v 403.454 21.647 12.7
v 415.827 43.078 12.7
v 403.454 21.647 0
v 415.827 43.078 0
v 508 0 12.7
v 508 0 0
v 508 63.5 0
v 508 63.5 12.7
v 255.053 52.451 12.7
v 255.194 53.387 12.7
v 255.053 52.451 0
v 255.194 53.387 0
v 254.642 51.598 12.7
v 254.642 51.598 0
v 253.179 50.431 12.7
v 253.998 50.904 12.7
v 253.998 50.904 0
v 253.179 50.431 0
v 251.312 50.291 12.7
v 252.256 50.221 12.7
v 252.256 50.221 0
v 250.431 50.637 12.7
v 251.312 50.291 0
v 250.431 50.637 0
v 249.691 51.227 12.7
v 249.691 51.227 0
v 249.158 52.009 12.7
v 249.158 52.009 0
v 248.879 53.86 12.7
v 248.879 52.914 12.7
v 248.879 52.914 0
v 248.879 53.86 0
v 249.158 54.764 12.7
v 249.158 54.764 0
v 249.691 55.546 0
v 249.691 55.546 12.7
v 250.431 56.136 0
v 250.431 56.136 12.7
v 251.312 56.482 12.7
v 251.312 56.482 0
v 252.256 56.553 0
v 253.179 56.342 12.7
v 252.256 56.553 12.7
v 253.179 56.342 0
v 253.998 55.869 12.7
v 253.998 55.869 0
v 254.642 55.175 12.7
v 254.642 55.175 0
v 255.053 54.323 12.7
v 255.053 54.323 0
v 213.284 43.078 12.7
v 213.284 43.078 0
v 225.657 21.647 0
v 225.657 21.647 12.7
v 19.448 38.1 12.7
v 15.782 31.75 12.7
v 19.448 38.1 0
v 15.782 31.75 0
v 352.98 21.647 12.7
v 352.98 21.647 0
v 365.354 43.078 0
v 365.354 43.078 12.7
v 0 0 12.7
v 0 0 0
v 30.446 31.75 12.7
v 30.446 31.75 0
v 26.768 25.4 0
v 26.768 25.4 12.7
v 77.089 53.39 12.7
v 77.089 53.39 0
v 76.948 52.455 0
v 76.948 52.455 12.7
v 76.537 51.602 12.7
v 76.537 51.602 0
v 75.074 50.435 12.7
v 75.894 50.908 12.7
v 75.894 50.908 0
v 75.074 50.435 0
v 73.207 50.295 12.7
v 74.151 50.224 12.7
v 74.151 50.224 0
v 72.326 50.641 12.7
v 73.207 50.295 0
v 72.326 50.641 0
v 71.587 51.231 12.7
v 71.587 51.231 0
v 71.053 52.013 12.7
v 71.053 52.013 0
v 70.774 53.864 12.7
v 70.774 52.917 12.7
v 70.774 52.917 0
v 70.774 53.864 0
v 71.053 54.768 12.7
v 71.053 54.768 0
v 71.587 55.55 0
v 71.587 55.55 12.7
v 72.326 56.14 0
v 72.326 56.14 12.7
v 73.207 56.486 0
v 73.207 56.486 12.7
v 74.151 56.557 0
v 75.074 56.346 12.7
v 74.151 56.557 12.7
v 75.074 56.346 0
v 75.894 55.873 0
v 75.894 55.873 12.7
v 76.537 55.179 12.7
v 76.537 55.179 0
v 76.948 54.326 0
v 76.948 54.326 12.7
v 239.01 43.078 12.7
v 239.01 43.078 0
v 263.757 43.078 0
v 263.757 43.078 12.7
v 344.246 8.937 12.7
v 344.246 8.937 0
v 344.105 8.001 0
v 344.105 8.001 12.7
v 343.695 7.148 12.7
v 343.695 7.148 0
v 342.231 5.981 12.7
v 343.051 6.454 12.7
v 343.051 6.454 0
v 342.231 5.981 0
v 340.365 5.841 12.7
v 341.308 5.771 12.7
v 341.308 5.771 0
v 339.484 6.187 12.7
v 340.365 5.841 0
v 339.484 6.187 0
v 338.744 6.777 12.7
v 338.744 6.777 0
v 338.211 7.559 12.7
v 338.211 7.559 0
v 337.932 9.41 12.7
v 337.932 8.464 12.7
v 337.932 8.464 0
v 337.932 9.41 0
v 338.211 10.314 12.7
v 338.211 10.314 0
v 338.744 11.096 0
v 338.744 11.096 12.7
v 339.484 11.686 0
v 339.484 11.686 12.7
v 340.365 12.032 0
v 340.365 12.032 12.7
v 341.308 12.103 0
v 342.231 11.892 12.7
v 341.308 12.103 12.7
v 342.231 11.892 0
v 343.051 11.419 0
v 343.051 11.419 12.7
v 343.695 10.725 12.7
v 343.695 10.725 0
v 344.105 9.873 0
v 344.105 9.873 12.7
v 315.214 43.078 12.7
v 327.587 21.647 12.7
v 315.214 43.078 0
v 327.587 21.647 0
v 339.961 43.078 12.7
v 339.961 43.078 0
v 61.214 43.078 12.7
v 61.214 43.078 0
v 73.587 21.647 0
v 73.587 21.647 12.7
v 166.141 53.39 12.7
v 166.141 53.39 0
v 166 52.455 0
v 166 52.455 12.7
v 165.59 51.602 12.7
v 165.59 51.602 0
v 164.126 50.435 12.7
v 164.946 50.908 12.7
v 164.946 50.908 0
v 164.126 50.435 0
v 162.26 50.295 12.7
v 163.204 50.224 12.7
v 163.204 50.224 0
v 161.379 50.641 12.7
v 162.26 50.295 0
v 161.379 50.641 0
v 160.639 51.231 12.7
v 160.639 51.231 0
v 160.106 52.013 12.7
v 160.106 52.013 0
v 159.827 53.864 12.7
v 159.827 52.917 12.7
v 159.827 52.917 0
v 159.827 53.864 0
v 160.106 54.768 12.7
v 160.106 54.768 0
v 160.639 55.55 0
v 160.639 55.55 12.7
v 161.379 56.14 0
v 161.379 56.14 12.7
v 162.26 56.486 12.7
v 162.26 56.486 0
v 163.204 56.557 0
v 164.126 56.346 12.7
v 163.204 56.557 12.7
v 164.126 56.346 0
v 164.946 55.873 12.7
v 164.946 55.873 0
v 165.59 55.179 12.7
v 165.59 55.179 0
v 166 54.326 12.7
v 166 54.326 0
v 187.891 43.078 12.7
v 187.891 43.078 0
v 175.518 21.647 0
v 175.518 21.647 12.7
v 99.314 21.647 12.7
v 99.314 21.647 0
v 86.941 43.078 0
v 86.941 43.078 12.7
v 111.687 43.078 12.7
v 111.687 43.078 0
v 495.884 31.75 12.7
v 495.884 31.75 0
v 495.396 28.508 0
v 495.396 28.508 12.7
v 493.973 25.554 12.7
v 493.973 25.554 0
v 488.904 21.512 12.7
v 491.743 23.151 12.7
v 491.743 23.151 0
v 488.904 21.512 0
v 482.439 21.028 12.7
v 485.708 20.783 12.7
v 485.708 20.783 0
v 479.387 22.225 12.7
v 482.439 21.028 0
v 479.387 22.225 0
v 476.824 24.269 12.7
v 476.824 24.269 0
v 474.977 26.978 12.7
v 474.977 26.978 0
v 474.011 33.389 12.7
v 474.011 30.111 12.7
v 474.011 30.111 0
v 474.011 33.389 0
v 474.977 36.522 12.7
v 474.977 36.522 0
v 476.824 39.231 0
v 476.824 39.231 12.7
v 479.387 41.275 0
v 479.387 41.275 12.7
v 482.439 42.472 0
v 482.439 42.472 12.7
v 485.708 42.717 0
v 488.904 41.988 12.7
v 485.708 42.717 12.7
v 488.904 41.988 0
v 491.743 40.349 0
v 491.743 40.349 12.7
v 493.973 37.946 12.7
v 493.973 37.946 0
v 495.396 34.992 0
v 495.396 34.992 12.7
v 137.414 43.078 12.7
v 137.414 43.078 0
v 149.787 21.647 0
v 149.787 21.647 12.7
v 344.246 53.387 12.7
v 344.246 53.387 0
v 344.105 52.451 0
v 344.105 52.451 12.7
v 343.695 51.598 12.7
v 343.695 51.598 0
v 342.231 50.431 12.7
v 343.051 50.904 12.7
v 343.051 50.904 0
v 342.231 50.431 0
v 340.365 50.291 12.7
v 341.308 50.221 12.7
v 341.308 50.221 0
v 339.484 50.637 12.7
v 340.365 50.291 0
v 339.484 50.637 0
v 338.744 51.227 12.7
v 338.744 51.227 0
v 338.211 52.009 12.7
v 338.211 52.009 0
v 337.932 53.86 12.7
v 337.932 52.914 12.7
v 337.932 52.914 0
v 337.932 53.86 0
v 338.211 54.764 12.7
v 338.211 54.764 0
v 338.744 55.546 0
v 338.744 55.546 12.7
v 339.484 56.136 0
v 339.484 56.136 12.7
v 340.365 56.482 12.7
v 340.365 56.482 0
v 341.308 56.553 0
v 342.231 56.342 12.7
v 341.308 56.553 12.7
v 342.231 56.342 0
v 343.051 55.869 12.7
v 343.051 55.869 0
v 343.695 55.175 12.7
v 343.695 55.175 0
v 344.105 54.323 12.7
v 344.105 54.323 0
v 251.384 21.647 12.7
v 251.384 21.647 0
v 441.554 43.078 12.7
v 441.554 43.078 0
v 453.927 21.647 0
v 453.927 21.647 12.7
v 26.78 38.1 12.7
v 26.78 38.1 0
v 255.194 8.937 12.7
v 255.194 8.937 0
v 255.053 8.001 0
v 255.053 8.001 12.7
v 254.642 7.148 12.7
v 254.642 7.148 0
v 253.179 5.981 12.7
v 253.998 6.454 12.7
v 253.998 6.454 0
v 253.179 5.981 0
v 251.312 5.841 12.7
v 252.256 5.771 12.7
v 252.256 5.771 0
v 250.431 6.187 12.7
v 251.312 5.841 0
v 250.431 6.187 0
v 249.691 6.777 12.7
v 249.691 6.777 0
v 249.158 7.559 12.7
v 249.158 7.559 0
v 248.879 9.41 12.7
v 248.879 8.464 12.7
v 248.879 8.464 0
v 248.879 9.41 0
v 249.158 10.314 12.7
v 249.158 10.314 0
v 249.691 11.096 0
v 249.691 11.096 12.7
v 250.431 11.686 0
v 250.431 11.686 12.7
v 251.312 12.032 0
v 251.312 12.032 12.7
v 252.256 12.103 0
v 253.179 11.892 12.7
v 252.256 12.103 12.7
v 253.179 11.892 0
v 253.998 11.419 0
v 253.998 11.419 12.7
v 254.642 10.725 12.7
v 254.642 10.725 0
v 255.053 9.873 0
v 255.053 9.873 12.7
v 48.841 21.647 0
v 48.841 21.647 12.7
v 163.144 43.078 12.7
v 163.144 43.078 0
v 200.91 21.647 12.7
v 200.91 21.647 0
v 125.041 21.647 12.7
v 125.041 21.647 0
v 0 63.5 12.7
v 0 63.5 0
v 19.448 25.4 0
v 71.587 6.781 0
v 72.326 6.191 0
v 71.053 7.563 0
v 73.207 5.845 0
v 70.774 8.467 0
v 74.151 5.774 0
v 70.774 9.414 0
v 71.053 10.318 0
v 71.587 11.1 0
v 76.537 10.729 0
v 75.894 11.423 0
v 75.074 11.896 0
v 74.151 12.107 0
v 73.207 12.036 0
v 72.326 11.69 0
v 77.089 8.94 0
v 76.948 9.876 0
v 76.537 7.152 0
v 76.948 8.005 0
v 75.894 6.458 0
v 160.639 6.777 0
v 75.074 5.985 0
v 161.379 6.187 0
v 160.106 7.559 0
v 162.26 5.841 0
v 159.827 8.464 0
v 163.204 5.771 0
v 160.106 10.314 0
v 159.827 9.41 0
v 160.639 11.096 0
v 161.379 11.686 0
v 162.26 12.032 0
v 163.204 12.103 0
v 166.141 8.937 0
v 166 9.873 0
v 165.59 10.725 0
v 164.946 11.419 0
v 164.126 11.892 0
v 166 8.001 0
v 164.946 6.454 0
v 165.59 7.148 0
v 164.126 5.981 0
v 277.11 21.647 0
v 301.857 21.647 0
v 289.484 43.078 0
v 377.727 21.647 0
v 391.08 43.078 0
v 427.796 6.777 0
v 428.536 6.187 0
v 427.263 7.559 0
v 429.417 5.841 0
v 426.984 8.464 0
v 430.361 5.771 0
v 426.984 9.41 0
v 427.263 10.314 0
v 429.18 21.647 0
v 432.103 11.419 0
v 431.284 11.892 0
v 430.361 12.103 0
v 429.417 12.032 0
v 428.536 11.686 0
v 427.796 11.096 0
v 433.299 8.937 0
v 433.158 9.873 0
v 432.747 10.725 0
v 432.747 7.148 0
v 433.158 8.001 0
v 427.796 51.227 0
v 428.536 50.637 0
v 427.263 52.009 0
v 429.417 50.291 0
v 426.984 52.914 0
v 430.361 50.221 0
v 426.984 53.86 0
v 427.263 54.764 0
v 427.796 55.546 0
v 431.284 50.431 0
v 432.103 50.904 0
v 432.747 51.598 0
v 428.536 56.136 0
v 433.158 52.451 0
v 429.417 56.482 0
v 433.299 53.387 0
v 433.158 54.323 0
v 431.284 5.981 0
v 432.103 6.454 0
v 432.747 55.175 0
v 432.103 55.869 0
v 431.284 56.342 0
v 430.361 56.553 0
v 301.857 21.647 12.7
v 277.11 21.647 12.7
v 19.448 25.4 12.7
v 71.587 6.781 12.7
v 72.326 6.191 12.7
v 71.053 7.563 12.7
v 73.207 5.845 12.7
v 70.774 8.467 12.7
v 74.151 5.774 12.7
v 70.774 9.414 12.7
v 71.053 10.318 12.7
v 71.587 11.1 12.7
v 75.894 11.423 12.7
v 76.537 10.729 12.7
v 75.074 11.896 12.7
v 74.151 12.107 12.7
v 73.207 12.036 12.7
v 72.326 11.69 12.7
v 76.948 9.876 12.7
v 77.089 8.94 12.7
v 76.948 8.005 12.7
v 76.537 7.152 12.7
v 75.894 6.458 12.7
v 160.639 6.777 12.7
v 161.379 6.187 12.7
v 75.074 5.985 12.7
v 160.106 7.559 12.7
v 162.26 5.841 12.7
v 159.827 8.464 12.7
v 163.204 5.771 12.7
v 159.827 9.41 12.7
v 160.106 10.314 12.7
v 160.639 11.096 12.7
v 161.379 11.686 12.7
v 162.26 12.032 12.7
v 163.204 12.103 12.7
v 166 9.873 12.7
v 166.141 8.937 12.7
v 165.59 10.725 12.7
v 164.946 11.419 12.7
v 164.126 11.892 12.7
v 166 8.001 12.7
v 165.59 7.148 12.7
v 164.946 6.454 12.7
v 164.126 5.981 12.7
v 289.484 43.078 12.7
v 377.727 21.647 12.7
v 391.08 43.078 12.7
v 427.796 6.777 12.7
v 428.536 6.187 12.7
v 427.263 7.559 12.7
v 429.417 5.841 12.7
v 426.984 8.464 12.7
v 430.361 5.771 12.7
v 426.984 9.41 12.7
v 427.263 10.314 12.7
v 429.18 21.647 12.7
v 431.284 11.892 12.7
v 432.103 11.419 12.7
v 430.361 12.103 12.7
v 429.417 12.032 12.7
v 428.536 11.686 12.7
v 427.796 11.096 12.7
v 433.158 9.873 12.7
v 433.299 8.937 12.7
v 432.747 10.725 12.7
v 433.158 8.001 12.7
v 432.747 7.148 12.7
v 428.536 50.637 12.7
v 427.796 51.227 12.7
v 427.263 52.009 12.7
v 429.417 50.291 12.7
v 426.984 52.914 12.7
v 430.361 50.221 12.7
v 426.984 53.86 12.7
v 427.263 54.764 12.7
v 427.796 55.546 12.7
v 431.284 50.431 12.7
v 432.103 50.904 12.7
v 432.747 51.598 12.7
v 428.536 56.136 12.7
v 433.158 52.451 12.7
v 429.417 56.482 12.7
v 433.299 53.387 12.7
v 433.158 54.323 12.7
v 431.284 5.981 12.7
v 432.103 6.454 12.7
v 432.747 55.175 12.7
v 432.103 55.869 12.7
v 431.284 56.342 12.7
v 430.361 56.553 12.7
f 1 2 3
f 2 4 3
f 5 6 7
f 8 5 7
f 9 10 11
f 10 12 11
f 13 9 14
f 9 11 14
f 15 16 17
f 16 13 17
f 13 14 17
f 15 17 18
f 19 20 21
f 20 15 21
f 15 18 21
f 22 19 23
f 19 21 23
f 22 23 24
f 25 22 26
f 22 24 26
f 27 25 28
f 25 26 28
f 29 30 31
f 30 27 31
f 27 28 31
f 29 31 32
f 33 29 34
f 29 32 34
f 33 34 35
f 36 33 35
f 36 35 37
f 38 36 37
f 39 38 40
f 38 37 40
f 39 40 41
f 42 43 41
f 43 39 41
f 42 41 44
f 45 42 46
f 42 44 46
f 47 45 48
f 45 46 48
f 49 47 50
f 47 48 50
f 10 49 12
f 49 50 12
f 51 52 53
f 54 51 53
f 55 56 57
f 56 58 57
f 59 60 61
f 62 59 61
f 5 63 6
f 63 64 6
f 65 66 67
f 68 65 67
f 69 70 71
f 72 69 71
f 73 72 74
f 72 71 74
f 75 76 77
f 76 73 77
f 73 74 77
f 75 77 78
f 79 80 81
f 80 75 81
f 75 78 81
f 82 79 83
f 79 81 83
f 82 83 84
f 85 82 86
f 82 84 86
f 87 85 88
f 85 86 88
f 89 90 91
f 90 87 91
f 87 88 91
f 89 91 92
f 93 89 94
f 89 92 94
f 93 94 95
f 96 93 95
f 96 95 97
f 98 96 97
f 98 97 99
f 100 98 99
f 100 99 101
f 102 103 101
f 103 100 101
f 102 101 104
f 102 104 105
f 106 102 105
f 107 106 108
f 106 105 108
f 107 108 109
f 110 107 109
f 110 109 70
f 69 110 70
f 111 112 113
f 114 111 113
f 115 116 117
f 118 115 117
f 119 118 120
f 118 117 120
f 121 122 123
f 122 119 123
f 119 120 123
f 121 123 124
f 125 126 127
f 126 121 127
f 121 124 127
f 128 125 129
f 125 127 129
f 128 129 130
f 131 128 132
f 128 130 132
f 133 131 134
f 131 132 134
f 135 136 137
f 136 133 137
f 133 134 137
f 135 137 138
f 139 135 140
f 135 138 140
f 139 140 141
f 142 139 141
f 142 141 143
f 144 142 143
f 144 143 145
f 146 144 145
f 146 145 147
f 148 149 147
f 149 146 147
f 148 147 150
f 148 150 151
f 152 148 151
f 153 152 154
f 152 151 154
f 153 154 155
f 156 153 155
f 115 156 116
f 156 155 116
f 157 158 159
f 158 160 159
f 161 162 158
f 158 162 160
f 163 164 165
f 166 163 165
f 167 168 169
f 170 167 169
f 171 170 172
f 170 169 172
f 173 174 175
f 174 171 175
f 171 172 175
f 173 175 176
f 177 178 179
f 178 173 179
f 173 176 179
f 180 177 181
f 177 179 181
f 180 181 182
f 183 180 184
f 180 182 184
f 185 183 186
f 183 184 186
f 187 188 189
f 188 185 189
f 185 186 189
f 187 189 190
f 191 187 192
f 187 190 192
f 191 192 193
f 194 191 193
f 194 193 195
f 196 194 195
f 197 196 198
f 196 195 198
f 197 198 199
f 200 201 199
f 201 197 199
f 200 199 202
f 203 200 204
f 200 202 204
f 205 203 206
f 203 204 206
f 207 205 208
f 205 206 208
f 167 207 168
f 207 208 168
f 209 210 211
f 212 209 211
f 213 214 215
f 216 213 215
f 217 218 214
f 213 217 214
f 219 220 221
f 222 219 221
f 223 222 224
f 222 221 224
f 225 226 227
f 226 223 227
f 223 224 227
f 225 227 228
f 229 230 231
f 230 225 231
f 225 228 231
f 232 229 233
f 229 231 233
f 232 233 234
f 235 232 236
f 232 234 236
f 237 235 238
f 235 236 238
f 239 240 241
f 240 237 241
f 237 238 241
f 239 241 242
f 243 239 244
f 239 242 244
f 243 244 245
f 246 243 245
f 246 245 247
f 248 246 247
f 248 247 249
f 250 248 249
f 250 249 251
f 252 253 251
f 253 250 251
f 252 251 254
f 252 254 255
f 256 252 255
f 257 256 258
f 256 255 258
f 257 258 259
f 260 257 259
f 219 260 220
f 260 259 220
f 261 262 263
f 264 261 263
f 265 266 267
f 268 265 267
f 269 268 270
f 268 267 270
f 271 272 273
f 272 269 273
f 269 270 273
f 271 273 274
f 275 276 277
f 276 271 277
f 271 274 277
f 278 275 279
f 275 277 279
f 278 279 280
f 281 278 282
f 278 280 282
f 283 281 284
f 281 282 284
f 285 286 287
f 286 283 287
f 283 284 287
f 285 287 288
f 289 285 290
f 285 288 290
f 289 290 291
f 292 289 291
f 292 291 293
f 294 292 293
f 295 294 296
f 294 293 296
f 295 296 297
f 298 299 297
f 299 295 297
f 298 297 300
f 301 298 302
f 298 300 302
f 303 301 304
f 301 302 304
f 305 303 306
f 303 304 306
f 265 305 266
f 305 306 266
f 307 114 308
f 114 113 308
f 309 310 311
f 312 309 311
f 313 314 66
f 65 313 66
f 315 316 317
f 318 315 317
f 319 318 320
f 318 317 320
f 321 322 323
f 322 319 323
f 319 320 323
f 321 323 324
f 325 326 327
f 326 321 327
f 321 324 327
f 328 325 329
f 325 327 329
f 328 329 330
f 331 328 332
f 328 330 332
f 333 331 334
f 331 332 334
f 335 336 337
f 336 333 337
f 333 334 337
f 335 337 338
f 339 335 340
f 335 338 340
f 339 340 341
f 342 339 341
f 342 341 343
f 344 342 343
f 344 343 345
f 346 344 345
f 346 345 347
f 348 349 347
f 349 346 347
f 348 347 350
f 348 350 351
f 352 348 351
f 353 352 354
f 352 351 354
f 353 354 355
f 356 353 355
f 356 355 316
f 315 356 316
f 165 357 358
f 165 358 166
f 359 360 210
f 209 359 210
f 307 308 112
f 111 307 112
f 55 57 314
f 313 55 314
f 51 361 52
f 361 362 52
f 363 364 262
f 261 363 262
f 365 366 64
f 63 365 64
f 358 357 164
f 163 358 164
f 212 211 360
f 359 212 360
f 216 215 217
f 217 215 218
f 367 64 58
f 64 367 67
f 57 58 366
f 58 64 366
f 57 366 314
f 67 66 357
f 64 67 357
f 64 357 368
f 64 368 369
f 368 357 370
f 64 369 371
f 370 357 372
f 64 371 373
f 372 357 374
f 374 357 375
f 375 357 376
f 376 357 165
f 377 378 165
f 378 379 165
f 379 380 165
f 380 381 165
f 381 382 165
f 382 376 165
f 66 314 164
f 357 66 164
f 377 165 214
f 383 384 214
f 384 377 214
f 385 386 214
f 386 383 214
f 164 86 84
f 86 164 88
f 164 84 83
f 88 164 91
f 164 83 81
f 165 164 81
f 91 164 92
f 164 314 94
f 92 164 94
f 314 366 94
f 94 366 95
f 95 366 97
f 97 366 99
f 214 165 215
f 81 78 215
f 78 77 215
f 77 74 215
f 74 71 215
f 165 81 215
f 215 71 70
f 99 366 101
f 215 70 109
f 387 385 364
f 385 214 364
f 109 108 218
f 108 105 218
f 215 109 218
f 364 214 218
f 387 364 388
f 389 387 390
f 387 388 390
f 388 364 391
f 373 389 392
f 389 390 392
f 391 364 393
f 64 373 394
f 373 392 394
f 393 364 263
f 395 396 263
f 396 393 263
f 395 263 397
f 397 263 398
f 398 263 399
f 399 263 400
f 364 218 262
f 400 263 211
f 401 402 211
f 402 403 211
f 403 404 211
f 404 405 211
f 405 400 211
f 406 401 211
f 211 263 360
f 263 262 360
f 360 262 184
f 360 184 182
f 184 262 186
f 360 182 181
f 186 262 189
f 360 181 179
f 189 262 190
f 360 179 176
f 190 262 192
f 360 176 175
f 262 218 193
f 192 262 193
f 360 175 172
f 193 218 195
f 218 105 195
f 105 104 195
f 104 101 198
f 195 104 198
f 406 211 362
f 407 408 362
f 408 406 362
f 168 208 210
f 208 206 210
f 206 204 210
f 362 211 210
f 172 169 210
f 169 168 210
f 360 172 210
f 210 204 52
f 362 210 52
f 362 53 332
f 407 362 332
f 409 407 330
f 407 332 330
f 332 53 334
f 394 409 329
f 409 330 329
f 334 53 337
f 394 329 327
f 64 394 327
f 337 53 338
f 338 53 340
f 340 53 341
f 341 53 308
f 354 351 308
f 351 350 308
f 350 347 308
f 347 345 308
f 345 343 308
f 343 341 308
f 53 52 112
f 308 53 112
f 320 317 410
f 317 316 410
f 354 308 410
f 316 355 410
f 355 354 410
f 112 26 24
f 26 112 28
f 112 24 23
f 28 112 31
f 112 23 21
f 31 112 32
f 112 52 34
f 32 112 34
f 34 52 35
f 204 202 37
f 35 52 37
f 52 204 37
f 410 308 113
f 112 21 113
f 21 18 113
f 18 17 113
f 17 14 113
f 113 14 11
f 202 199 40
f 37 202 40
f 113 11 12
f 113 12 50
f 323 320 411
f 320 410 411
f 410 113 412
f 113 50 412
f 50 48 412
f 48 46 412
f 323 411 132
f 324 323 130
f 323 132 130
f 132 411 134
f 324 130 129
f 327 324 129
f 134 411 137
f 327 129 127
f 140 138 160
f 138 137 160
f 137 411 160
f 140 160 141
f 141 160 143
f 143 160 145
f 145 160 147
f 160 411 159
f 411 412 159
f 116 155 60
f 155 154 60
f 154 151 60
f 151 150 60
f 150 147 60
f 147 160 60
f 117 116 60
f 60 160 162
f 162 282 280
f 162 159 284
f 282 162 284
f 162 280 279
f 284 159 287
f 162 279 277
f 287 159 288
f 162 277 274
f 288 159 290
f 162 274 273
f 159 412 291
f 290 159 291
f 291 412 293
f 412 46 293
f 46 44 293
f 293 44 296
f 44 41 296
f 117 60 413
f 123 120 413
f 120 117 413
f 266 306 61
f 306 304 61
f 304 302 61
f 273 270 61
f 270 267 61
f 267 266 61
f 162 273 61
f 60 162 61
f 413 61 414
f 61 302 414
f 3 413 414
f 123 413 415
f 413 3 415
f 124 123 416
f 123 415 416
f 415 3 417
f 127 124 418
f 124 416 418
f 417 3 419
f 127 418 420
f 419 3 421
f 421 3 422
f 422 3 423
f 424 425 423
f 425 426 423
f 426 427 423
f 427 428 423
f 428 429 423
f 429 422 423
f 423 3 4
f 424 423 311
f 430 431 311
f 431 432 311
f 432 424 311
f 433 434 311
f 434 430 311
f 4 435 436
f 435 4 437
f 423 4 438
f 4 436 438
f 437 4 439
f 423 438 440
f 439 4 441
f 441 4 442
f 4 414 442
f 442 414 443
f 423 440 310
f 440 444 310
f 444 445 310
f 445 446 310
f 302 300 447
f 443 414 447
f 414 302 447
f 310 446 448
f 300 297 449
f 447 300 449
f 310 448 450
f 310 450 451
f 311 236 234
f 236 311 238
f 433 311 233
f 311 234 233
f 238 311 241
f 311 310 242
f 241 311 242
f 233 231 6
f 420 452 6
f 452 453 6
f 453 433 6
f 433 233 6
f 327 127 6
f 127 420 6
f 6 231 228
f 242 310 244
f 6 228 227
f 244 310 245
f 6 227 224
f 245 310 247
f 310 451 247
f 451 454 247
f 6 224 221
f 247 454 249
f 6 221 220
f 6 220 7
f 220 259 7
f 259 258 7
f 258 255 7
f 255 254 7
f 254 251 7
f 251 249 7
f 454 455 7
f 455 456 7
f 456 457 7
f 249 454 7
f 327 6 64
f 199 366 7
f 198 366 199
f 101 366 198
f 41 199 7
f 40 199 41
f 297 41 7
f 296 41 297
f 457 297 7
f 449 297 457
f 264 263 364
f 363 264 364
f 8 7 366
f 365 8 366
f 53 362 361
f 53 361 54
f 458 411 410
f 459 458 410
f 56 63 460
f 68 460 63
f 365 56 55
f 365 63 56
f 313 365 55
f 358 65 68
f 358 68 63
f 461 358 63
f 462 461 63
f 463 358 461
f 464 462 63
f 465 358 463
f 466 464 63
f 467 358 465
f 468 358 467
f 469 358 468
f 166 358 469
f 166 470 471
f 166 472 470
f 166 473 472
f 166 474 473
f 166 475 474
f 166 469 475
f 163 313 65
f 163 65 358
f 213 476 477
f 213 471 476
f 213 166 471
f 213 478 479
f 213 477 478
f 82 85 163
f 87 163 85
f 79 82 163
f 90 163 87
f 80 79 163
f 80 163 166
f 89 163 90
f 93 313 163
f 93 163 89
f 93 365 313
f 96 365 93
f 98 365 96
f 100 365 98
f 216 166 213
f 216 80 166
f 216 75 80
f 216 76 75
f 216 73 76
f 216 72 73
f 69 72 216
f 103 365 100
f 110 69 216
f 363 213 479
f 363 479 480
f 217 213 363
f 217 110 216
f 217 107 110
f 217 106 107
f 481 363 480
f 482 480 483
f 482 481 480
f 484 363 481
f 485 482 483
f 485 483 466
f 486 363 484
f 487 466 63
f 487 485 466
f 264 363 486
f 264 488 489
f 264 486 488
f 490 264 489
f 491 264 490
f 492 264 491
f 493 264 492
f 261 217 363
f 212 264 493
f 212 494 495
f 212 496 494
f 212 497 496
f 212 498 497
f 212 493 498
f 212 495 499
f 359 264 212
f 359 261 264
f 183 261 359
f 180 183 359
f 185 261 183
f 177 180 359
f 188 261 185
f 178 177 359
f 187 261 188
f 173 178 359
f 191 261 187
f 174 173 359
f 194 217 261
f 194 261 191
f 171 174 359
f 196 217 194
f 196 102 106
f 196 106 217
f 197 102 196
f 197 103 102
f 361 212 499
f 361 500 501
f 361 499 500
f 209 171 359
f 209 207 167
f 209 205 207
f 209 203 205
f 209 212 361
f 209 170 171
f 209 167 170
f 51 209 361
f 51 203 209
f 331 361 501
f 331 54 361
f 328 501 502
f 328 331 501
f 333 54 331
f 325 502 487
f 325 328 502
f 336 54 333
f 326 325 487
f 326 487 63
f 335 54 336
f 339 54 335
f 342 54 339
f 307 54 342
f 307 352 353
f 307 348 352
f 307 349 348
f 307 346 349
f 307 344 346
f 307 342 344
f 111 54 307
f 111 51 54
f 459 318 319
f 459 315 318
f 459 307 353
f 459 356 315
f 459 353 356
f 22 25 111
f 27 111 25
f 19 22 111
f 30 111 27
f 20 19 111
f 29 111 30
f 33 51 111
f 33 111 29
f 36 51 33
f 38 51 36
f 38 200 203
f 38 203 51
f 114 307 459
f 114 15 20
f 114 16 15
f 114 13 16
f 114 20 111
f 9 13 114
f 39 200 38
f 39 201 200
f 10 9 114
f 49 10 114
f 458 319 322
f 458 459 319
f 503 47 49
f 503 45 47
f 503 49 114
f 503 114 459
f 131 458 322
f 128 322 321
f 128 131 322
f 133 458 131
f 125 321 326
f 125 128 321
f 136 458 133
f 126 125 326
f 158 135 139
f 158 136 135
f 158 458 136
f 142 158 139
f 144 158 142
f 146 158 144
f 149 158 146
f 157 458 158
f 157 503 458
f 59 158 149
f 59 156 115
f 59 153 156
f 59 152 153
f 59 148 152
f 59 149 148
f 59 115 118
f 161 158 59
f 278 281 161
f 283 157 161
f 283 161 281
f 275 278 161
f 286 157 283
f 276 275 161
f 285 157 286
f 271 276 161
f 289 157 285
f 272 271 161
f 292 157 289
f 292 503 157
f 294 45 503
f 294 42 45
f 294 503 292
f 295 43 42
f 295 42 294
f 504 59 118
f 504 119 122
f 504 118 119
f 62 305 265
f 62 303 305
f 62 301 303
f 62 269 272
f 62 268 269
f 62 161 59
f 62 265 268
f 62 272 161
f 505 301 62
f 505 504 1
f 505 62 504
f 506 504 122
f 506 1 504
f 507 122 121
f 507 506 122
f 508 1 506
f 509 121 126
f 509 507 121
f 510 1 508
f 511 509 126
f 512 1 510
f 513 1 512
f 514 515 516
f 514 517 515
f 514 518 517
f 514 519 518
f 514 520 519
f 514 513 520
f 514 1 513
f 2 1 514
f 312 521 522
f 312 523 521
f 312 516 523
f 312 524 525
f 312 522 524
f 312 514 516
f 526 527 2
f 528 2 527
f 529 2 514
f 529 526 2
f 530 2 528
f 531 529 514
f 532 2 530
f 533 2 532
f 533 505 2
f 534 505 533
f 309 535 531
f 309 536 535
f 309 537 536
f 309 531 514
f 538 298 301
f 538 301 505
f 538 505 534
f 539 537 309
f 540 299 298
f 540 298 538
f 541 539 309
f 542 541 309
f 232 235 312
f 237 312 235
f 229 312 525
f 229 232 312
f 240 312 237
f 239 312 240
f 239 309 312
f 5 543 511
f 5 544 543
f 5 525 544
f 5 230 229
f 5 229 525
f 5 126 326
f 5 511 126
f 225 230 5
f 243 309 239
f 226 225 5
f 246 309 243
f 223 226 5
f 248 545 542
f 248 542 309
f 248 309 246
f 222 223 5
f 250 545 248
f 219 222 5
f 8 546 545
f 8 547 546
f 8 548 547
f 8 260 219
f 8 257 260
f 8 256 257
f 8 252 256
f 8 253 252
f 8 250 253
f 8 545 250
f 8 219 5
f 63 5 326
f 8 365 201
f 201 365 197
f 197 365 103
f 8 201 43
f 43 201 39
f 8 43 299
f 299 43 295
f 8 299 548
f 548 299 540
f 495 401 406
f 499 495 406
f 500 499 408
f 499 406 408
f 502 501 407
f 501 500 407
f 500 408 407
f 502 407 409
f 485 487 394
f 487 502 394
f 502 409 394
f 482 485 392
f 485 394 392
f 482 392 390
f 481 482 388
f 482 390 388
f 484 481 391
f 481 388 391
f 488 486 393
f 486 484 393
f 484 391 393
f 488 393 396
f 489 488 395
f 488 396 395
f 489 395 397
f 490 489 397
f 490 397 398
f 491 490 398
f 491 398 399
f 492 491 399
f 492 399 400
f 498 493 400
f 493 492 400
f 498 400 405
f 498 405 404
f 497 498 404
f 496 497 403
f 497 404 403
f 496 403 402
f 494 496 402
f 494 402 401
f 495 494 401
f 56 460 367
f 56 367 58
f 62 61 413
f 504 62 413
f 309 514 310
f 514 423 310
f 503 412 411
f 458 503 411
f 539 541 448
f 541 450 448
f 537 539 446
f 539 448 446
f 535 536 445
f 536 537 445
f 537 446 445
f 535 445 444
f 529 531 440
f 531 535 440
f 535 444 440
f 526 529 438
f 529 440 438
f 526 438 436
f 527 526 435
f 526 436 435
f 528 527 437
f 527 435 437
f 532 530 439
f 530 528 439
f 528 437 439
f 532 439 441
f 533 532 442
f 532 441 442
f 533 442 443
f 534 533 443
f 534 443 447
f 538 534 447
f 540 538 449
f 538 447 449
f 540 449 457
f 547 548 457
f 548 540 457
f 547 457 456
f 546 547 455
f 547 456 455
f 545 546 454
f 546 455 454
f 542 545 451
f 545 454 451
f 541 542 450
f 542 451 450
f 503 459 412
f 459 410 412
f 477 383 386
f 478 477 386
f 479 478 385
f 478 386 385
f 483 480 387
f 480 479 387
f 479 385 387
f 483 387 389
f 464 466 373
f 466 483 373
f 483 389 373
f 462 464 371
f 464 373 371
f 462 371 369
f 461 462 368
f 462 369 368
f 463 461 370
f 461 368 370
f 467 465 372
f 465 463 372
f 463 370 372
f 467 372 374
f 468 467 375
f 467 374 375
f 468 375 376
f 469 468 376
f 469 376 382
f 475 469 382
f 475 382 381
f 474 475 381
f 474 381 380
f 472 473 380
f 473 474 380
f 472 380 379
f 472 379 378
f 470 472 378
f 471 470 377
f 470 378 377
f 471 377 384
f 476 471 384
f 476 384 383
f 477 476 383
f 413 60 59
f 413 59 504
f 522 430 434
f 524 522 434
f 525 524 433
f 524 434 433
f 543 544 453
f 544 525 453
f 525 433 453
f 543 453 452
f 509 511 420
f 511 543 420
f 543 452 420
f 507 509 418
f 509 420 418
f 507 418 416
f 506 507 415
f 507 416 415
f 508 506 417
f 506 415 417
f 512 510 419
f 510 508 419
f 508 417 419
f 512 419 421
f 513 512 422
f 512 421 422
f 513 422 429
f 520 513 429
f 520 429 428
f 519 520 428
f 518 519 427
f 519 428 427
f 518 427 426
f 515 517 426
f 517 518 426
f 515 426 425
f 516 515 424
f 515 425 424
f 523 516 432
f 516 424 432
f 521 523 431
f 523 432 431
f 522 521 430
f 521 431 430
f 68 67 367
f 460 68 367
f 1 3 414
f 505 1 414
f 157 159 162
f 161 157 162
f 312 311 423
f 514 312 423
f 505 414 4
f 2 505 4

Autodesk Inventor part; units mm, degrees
ref_plane "YZ Plane" through (0, 0, 0) normal (1, 0, 0) x (0, 1, 0)
ref_plane "XZ Plane" through (0, 0, 0) normal (0, 1, 0) x (-1, 0, 0)
ref_plane "XY Plane" through (0, 0, 0) normal (0, 0, 1) x (1, 0, 0)
sketch "Sketch1" plane through (0, 0, 0) normal (0, 0, 1) x (1, 0, 0)
  line L0 (0, 0) -> (508, 0)
  line L1 (508, 0) -> (508, 63.5)
  line L2 (508, 63.5) -> (0, 63.5)
  line L3 (0, 63.5) -> (0, 0)
  circle A0 centre (484.886, 31.75) radius 10.9982
  circle A1 centre (73.914, 53.3905) radius 3.175
  circle A2 centre (162.9664, 53.3905) radius 3.175
  circle A3 centre (252.0188, 53.3868) radius 3.175
  circle A4 centre (341.0712, 53.3868) radius 3.175
  circle A5 centre (430.1236, 53.3868) radius 3.175
  circle A6 centre (73.914, 8.9405) radius 3.175
  circle A7 centre (162.9664, 8.9368) radius 3.175
  circle A8 centre (252.0188, 8.9368) radius 3.175
  circle A9 centre (341.0712, 8.9368) radius 3.175
  circle A10 centre (430.1236, 8.9368) radius 3.175
  line L4 (61.214, 43.0781) -> (73.5873, 21.6469)
  line L5 (48.8407, 21.6469) -> (61.214, 43.0781)
  line L6 (137.414, 43.0781) -> (149.7873, 21.6469)
  line L7 (149.7873, 21.6469) -> (125.0407, 21.6469)
  line L8 (125.0407, 21.6469) -> (137.414, 43.0781)
  line L9 (99.314, 21.6469) -> (86.9407, 43.0781)
  line L10 (86.9407, 43.0781) -> (111.6873, 43.0781)
  line L11 (111.6873, 43.0781) -> (99.314, 21.6469)
  line L12 (26.7802, 38.1) -> (30.4463, 31.75)
  line L13 (30.4463, 31.75) -> (26.7681, 25.4)
  line L14 (26.7681, 25.4) -> (19.4478, 25.4)
  line L15 (19.4478, 25.4) -> (15.7817, 31.75)
  line L16 (15.7817, 31.75) -> (19.4478, 38.1)
  line L17 (19.4478, 38.1) -> (26.7802, 38.1)
  line L18 (48.8407, 21.6469) -> (73.5873, 21.6469)
  line L19 (289.4838, 43.0781) -> (301.8571, 21.6469)
  line L20 (301.8571, 21.6469) -> (277.1105, 21.6469)
  line L21 (277.1105, 21.6469) -> (289.4838, 43.0781)
  line L22 (263.7571, 43.0781) -> (251.3838, 21.6469)
  line L23 (251.3838, 21.6469) -> (239.0105, 43.0781)
  line L24 (239.0105, 43.0781) -> (263.7571, 43.0781)
  line L25 (213.2838, 43.0781) -> (225.6571, 21.6469)
  line L26 (200.9105, 21.6469) -> (225.6571, 21.6469)
  line L27 (200.9105, 21.6469) -> (213.2838, 43.0781)
  line L28 (441.5536, 43.0781) -> (453.9269, 21.6469)
  line L29 (453.9269, 21.6469) -> (429.1803, 21.6469)
  line L30 (429.1803, 21.6469) -> (441.5536, 43.0781)
  line L31 (415.8269, 43.0781) -> (403.4536, 21.6469)
  line L32 (403.4536, 21.6469) -> (391.0803, 43.0781)
  line L33 (391.0803, 43.0781) -> (415.8269, 43.0781)
  line L34 (365.3536, 43.0781) -> (377.7269, 21.6469)
  line L35 (352.9803, 21.6469) -> (377.7269, 21.6469)
  line L36 (352.9803, 21.6469) -> (365.3536, 43.0781)
  line L37 (175.5175, 21.6469) -> (163.1442, 43.0781)
  line L38 (163.1442, 43.0781) -> (187.8909, 43.0781)
  line L39 (187.8909, 43.0781) -> (175.5175, 21.6469)
  line L40 (339.9607, 43.0781) -> (327.5873, 21.6469)
  line L41 (327.5873, 21.6469) -> (315.214, 43.0781)
  line L42 (315.214, 43.0781) -> (339.9607, 43.0781)
  point P0 (135.1884, 47.8306)
  point P1 (135.1884, 33.5431)
  point P2 (23.114, 19.05)
  point P3 (23.114, 25.4)
  point P4 (287.2582, 33.5431)
  point P5 (439.328, 33.5431)
  dimension "d18" = 44.45
  dimension "d36" = 56.5658
  dimension "d69" = 126.3396
  dimension "d72" = 25.4
  dimension "d0" = 508
  dimension "d1" = 63.5
  dimension "d3" = 21.9964
  dimension "d12" = 6.35
  dimension "d15" = 89.0524
  dimension "d44" = 6.35
  dimension "d66" = 100.9467
  dimension "d91" = 22.0726
  dimension "d97" = 152.0698
  dimension "d102" = 51.1231
extrude "Extrusion1" add sketch "Sketch1" along normal blind 12.7 contours L3 L2 L1 L0 | L4 L18 L5 | L12 L13 L14 L15 L16 L17 | L19 L20 L21 | L22 L23 L24 | L25 L26 L27 | L28 L29 L30 | L31 L32 L33 | L34 L35 L36 | L37 L38 L39 | L40 L41 L42
extrude "Extrusion2" cut sketch "Sketch1" along normal blind 25.4 contours L12 L13 L14 L15 L16 L17
extrude "Extrusion4" cut sketch "Sketch1" along normal blind 12.7 contours L4 L18 L5
extrude "Extrusion5" cut sketch "Sketch1" along normal blind 12.7 contours L19 L20 L21 | L22 L23 L24 | L25 L26 L27 | L28 L29 L30 | L31 L32 L33 | L34 L35 L36 | L37 L38 L39 | L40 L41 L42
properties part number "arm_plate_btw_support_bicep"
